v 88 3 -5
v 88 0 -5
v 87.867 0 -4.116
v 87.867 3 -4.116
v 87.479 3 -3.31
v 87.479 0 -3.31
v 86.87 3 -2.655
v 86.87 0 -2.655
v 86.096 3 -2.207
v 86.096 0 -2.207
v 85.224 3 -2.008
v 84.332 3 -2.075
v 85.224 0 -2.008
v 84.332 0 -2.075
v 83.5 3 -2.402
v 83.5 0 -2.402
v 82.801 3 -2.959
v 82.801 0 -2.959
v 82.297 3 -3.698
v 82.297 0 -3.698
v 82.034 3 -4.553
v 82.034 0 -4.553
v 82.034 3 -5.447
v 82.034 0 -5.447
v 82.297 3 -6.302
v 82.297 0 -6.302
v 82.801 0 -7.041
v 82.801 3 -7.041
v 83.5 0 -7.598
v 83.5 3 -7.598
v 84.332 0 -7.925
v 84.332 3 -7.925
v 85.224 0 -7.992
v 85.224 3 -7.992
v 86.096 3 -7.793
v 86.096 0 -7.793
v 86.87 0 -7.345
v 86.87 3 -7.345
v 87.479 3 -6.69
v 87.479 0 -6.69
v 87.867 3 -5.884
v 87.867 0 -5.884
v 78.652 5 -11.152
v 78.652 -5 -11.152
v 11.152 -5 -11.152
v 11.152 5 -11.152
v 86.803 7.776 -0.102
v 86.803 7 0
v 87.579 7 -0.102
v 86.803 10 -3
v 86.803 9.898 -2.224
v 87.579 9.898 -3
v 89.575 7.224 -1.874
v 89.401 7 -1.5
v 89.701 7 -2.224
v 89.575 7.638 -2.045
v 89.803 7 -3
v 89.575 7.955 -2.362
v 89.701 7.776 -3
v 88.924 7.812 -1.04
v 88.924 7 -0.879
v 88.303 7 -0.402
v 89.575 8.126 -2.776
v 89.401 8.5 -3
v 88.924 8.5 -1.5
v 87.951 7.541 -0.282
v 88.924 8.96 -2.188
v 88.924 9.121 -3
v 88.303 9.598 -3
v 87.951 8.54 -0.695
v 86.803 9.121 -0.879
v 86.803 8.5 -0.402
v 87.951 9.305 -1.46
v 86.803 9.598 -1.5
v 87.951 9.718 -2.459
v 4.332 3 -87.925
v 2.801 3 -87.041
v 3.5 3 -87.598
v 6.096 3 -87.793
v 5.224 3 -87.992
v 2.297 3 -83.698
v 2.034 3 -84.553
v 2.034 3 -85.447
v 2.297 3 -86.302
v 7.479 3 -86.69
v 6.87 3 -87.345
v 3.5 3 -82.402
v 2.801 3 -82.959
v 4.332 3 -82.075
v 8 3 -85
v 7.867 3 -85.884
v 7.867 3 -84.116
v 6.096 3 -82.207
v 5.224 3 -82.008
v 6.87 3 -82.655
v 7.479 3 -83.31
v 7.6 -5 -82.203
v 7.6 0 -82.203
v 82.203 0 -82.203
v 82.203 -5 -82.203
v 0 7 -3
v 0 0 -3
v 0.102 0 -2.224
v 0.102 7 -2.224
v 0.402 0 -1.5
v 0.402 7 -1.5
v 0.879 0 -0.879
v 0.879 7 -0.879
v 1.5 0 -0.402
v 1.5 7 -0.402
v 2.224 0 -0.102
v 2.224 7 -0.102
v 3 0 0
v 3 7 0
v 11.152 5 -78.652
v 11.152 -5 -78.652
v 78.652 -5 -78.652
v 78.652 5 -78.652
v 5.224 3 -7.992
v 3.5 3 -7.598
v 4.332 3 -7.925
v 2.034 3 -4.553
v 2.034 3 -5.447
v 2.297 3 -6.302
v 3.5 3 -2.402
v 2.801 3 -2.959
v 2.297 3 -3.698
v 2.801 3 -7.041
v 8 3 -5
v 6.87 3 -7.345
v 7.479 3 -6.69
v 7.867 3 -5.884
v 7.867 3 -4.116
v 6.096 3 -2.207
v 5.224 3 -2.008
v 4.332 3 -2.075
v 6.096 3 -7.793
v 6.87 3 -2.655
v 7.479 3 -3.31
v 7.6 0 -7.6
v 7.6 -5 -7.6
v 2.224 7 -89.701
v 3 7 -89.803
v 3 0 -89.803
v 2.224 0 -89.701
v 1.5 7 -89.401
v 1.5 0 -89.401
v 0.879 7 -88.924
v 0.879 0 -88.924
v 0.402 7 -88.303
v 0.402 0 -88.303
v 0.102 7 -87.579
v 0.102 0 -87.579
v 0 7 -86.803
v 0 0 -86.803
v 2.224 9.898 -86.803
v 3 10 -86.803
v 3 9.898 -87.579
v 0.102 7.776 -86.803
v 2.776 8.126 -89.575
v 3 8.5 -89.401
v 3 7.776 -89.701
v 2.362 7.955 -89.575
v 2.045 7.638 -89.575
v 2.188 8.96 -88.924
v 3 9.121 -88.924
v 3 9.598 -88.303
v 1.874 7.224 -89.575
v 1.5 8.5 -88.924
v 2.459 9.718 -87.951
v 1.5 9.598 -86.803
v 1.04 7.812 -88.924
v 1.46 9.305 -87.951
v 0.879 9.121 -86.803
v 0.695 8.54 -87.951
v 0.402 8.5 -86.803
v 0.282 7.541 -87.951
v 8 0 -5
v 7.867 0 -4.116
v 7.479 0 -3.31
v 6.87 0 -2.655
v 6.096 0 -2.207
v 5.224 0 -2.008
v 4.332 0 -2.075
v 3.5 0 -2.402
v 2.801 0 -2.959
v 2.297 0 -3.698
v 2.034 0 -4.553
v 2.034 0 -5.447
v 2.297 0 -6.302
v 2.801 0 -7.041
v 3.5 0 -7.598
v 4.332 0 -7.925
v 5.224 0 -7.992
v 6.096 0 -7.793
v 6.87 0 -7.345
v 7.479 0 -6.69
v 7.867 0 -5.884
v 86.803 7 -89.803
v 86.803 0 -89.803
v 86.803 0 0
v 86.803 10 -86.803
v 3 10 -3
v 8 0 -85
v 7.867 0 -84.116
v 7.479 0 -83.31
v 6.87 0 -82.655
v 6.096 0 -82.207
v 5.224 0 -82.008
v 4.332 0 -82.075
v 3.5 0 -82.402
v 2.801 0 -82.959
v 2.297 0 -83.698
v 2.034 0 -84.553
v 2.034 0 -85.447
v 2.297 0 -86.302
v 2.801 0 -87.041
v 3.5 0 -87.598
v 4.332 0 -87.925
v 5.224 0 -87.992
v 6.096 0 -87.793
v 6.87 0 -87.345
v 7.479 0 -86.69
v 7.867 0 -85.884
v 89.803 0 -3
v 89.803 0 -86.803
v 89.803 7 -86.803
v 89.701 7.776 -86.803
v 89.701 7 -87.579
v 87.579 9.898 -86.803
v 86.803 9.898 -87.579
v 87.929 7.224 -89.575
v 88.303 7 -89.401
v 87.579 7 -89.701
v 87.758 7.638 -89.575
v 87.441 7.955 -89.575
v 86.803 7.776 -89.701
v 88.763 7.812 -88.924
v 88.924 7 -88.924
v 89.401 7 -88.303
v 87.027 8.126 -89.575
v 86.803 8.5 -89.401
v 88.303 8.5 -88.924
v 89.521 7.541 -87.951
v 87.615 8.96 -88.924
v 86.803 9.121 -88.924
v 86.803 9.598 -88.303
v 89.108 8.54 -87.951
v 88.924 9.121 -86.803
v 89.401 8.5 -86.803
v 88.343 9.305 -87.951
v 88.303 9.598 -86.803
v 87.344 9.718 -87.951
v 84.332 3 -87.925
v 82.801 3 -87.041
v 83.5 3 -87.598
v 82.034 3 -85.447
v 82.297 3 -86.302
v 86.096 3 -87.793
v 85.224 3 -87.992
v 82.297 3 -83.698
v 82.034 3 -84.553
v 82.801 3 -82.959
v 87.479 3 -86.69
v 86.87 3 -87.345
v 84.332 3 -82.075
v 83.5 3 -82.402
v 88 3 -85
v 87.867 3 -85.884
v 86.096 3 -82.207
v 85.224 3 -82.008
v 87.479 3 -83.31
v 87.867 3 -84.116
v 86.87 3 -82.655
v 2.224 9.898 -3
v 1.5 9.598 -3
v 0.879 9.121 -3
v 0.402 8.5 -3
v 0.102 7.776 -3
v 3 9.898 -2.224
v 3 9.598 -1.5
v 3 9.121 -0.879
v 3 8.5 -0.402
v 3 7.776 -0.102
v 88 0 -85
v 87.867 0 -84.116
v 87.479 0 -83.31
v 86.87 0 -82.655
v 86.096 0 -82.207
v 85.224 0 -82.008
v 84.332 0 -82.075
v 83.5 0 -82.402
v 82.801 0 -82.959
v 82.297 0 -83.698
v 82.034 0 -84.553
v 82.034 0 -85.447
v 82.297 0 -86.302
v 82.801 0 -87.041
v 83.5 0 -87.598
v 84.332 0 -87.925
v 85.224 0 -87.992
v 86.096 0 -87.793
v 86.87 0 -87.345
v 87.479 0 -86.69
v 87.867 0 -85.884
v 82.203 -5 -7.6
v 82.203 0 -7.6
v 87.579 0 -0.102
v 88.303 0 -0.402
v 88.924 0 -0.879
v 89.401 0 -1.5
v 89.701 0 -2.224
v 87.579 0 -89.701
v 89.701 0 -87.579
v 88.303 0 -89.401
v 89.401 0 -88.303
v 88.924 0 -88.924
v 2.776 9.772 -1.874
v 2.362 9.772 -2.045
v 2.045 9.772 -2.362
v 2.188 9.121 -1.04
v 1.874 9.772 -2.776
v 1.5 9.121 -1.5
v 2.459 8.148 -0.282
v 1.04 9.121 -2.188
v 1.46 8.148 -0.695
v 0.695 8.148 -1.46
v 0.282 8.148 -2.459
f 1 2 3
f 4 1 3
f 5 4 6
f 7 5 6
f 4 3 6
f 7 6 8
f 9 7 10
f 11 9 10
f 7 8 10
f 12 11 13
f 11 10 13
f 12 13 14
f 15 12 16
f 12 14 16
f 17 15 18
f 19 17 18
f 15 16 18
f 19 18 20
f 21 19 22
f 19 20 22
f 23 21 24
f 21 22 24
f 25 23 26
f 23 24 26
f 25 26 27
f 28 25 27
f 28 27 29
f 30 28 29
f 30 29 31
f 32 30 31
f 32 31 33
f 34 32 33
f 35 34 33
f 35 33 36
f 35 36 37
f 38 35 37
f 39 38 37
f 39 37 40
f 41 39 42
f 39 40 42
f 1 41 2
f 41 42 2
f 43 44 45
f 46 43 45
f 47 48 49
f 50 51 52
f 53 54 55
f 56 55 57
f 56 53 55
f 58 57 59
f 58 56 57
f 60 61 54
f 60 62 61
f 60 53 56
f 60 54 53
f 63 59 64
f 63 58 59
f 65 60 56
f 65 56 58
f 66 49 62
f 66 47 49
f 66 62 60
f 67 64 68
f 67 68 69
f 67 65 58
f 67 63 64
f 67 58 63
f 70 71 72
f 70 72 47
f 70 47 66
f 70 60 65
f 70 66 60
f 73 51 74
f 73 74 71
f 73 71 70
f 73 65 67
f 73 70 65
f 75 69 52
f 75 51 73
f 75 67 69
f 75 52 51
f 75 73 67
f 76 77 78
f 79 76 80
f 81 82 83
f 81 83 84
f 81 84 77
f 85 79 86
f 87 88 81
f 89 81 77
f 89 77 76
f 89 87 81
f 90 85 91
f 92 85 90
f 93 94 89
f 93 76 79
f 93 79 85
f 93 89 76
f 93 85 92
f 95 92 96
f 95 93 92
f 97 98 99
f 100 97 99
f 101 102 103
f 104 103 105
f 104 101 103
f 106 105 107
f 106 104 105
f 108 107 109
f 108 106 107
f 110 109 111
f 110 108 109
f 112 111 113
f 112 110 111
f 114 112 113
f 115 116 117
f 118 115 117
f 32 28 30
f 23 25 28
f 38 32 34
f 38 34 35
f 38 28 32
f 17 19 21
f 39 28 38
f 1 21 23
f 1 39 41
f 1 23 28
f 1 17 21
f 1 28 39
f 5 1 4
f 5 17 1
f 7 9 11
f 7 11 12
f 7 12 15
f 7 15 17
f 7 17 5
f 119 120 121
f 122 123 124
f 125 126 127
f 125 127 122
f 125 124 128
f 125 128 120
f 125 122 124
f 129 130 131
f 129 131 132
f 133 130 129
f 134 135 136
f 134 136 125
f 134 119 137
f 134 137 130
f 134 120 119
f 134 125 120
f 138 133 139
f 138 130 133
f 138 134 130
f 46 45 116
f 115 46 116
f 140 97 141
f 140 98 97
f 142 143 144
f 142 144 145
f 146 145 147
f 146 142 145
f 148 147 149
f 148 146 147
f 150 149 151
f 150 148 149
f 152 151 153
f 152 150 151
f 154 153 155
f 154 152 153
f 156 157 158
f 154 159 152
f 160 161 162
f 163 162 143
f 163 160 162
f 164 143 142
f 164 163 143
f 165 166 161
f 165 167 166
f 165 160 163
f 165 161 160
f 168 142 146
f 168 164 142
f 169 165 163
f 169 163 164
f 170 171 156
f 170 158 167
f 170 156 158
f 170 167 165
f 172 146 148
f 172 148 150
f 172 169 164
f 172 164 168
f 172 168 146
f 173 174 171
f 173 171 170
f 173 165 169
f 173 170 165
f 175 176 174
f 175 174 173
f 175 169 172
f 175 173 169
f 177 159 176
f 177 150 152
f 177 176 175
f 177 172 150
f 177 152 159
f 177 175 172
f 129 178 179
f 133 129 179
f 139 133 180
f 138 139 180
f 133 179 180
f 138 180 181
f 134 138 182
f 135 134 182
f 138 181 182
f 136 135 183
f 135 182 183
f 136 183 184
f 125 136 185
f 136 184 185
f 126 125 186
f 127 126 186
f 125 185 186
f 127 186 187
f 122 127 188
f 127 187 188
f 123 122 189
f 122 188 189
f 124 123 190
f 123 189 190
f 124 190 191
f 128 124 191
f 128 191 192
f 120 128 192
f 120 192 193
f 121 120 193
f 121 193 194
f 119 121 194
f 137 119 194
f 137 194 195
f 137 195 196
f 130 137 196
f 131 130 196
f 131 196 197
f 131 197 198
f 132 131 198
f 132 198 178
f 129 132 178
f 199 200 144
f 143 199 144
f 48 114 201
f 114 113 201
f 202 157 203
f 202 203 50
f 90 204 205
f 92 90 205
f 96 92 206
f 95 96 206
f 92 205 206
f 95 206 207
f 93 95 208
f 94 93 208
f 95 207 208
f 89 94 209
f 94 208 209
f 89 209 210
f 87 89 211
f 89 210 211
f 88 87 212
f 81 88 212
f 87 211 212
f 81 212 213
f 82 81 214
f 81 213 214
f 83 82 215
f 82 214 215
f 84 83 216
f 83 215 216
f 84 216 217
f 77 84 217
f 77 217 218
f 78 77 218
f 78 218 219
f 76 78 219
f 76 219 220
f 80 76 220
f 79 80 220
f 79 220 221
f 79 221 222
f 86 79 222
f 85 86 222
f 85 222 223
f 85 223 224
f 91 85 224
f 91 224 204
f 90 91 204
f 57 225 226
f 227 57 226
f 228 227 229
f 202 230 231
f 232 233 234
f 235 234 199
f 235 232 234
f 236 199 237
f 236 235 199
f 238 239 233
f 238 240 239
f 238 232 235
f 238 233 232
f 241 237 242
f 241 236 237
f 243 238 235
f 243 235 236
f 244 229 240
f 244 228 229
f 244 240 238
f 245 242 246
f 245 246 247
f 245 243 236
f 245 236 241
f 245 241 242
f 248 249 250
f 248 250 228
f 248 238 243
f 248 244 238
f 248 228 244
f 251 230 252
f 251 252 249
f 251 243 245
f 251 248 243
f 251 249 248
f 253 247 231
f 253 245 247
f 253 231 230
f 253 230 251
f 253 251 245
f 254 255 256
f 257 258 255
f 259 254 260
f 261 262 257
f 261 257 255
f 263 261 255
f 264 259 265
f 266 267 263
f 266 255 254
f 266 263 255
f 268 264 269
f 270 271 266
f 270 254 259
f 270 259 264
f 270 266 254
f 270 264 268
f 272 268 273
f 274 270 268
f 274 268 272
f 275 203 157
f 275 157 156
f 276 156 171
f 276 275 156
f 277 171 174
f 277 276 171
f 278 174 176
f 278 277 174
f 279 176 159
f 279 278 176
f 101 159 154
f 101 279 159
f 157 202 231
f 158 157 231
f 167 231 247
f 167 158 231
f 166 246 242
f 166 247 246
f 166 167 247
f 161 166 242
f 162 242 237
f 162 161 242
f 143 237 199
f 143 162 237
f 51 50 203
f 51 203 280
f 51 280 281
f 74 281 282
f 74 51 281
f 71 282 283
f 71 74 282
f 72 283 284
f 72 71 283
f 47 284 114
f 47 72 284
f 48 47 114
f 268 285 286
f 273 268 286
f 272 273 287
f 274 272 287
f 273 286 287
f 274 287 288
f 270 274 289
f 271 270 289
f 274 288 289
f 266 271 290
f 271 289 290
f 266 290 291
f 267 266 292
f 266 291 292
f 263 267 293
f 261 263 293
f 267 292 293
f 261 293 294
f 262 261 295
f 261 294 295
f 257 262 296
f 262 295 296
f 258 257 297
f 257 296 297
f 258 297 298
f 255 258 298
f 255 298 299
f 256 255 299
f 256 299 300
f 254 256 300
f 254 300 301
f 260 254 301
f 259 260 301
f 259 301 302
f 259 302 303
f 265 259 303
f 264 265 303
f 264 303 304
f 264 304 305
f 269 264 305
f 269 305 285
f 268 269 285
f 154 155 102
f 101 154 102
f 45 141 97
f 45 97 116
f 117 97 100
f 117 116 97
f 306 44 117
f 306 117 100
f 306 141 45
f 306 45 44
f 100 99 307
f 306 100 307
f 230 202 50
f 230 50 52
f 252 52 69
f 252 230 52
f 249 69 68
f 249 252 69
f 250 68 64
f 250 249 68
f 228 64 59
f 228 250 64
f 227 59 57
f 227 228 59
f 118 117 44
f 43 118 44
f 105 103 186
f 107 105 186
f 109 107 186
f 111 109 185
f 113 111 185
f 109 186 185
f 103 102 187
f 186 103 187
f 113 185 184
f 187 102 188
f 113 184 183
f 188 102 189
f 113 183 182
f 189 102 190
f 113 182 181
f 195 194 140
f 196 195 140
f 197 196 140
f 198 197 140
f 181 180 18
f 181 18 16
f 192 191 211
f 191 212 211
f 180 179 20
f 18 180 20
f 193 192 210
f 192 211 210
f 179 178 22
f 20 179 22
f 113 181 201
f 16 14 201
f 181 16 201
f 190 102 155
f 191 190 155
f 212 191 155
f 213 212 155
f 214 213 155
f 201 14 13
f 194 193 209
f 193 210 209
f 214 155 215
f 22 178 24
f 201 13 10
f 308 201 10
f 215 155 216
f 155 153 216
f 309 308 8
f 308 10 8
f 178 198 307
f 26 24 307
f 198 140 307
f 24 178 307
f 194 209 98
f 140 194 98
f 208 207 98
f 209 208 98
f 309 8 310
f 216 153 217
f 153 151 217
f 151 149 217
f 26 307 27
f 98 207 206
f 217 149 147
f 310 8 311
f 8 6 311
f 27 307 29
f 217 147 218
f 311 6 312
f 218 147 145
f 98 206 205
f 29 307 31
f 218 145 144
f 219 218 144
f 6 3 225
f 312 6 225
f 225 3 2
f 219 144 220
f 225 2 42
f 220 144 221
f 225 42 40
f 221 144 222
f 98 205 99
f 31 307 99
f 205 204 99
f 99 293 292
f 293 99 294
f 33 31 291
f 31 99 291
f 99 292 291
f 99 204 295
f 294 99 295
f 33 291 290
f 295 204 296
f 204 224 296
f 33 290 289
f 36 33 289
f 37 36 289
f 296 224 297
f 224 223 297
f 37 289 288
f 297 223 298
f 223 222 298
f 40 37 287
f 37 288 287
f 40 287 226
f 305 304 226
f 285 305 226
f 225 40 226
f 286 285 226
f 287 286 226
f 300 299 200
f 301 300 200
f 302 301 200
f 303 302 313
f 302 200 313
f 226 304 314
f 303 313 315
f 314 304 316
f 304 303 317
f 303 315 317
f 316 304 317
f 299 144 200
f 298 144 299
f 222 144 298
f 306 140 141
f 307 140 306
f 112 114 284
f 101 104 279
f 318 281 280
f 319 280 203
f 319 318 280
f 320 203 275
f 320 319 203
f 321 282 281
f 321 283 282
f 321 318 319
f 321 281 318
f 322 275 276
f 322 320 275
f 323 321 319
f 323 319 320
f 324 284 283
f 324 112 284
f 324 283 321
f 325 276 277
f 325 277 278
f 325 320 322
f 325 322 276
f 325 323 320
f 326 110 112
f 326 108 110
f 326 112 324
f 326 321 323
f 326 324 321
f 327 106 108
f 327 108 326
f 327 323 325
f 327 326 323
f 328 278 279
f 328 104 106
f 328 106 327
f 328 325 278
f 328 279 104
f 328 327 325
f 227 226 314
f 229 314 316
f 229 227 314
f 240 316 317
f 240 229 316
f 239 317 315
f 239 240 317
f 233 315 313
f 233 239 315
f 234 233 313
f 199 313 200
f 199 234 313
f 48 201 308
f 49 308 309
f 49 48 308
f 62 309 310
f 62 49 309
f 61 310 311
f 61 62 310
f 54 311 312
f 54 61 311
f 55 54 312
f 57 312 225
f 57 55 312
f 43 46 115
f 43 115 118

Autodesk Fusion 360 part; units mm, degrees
sketch "Sketch1" plane through (0, 0, 0) normal (0, 1, 0) x (1, 0, 0)
  line L0 (0, 0) -> (89.803, 0)
  line L1 (89.803, 0) -> (89.803, 89.803)
  line L2 (89.803, 89.803) -> (0, 89.803)
  line L3 (0, 89.803) -> (0, 0)
  dimension "d1" = 89.803
  dimension "d2" = 89.803
extrude "Extrude1" add sketch "Sketch1" along normal blind 10 makes body 1
sketch "Sketch6" plane through (0, 0, 0) normal (0, -1, 0) x (1, 0, 0)
  line L0 (0, -89.803) -> (89.803, -89.803)
  line L1 (89.803, -89.803) -> (89.803, 0)
  line L2 (89.803, 0) -> (0, 0)
  line L3 (77.4015, -12.4015) -> (12.4015, -12.4015)
  line L4 (12.4015, -12.4015) -> (12.4015, -77.4015)
  line L5 (12.4015, -77.4015) -> (77.4015, -77.4015)
  line L6 (77.4015, -77.4015) -> (77.4015, -12.4015)
  line L7 (77.4015, -12.4015) -> (12.4015, -77.4015) construction
  line L8 (12.4015, -12.4015) -> (77.4015, -77.4015) construction
  point P0 (44.9015, -44.9015)
  dimension "d12" = 65
  dimension "d13" = 65
extrude "Extrude3" add sketch "Sketch6" against normal blind 1 bodies 1
fillet "Fillet2" radius 3 8 edges at (0, 5, 0) (44.9015, 10, 0) (0, 10, -44.9015) (89.803, 10, -44.9015) (44.9015, 10, -89.803) (89.803, 5, 0) (89.803, 5, -89.803) (0, 5, -89.803) on bodies 1
copy_body "Body->Comp2" bodies 1 removing the originals makes body 2 in component "topbody2"
sketch "Sketch7" plane through (0, 0, 0) normal (0, -1, 0) x (1, 0, 0)
  arc A0 (86.803, -89.803) -> (89.803, -86.803) centre (86.803, -86.803) ccw
  line L0 (89.803, -86.803) -> (89.803, -3)
  arc A1 (89.803, -3) -> (86.803, 0) centre (86.803, -3) ccw
  line L1 (86.803, 0) -> (3, 0)
  arc A2 (3, 0) -> (0, -3) centre (3, -3) ccw
  line L2 (0, -3) -> (0, -86.803)
  arc A3 (0, -86.803) -> (3, -89.803) centre (3, -86.803) ccw
  line L3 (3, -89.803) -> (86.803, -89.803)
  circle A4 centre (5, -5) radius 3
  circle A5 centre (5, -85) radius 3
  circle A6 centre (85, -85) radius 3
  circle A7 centre (85, -5) radius 3
  dimension "d17" = 6
  dimension "d18" = 6
  dimension "d19" = 6
  dimension "d20" = 6
extrude "Extrude1'" cut sketch "Sketch7" against normal blind 3 contours A4 | A5 | A6 | A7 bodies 2 in component "topbody2"
sketch "Sketch8" plane through (0, 0, 0) normal (0, -1, 0) x (1, 0, 0)
  circle A0 centre (85, -5) radius 3
  circle A1 centre (85, -85) radius 3
  circle A2 centre (5, -5) radius 3
  circle A3 centre (5, -85) radius 3
  arc A4 (86.803, -89.803) -> (89.803, -86.803) centre (86.803, -86.803) ccw
  line L0 (89.803, -86.803) -> (89.803, -3)
  arc A5 (89.803, -3) -> (86.803, 0) centre (86.803, -3) ccw
  line L1 (86.803, 0) -> (3, 0)
  arc A6 (3, 0) -> (0, -3) centre (3, -3) ccw
  line L2 (0, -3) -> (0, -86.803)
  arc A7 (0, -86.803) -> (3, -89.803) centre (3, -86.803) ccw
  line L3 (3, -89.803) -> (86.803, -89.803)
  line L4 (7.6, -15) -> (7.6, -75)
  line L5 (14.4179, -82.203) -> (69.8225, -82.203)
  line L6 (82.203, -71.2718) -> (82.203, -12.7891)
  line L7 (70, -7.6) -> (20, -7.6)
  line L8 (7.6, -15) -> (7.6, -7.6)
  line L9 (7.6, -7.6) -> (20, -7.6)
  line L10 (7.6, -7.6) -> (20, -7.6)
  line L11 (20, -7.6) -> (70, -7.6)
  line L12 (70, -7.6) -> (82.203, -7.6)
  line L13 (82.203, -12.7891) -> (82.203, -7.6)
  line L14 (82.203, -71.2718) -> (82.203, -82.203)
  line L15 (69.8225, -82.203) -> (82.203, -82.203)
  line L16 (14.4179, -82.203) -> (7.6, -82.203)
  line L17 (7.6, -75) -> (7.6, -82.203)
extrude "Extrude2" add sketch "Sketch8" along normal blind 5 contours L4 L5 L6 L7 L8 L9 L10 L11 L12 L13 L14 L15 L16 L17 bodies 2 in component "topbody2"
sketch "Sketch9" plane through (0, -5, 0) normal (0, -1, 0) x (1, 0, 0)
  line L0 (7.6, -7.6) -> (7.6, -82.203)
  line L1 (7.6, -82.203) -> (82.203, -82.203)
  line L2 (82.203, -82.203) -> (82.203, -7.6)
  line L3 (82.203, -7.6) -> (7.6, -7.6)
  line L4 (78.6515, -11.1515) -> (11.1515, -11.1515)
  line L5 (11.1515, -11.1515) -> (11.1515, -78.6515)
  line L6 (11.1515, -78.6515) -> (78.6515, -78.6515)
  line L7 (78.6515, -78.6515) -> (78.6515, -11.1515)
  line L8 (78.6515, -11.1515) -> (11.1515, -78.6515) construction
  line L9 (11.1515, -11.1515) -> (78.6515, -78.6515) construction
  point P0 (44.9015, -44.9015)
  dimension "d33" = 67.5
  dimension "d34" = 67.5
extrude "Extrude3'" cut sketch "Sketch9" against normal blind 10 contours L4 L5 L6 L7 bodies 2 in component "topbody2"
component "topbody2" placed x (1, 0, 0) y (0, 1, 0) z (0, 0, 1) at (0, 0, 0)
